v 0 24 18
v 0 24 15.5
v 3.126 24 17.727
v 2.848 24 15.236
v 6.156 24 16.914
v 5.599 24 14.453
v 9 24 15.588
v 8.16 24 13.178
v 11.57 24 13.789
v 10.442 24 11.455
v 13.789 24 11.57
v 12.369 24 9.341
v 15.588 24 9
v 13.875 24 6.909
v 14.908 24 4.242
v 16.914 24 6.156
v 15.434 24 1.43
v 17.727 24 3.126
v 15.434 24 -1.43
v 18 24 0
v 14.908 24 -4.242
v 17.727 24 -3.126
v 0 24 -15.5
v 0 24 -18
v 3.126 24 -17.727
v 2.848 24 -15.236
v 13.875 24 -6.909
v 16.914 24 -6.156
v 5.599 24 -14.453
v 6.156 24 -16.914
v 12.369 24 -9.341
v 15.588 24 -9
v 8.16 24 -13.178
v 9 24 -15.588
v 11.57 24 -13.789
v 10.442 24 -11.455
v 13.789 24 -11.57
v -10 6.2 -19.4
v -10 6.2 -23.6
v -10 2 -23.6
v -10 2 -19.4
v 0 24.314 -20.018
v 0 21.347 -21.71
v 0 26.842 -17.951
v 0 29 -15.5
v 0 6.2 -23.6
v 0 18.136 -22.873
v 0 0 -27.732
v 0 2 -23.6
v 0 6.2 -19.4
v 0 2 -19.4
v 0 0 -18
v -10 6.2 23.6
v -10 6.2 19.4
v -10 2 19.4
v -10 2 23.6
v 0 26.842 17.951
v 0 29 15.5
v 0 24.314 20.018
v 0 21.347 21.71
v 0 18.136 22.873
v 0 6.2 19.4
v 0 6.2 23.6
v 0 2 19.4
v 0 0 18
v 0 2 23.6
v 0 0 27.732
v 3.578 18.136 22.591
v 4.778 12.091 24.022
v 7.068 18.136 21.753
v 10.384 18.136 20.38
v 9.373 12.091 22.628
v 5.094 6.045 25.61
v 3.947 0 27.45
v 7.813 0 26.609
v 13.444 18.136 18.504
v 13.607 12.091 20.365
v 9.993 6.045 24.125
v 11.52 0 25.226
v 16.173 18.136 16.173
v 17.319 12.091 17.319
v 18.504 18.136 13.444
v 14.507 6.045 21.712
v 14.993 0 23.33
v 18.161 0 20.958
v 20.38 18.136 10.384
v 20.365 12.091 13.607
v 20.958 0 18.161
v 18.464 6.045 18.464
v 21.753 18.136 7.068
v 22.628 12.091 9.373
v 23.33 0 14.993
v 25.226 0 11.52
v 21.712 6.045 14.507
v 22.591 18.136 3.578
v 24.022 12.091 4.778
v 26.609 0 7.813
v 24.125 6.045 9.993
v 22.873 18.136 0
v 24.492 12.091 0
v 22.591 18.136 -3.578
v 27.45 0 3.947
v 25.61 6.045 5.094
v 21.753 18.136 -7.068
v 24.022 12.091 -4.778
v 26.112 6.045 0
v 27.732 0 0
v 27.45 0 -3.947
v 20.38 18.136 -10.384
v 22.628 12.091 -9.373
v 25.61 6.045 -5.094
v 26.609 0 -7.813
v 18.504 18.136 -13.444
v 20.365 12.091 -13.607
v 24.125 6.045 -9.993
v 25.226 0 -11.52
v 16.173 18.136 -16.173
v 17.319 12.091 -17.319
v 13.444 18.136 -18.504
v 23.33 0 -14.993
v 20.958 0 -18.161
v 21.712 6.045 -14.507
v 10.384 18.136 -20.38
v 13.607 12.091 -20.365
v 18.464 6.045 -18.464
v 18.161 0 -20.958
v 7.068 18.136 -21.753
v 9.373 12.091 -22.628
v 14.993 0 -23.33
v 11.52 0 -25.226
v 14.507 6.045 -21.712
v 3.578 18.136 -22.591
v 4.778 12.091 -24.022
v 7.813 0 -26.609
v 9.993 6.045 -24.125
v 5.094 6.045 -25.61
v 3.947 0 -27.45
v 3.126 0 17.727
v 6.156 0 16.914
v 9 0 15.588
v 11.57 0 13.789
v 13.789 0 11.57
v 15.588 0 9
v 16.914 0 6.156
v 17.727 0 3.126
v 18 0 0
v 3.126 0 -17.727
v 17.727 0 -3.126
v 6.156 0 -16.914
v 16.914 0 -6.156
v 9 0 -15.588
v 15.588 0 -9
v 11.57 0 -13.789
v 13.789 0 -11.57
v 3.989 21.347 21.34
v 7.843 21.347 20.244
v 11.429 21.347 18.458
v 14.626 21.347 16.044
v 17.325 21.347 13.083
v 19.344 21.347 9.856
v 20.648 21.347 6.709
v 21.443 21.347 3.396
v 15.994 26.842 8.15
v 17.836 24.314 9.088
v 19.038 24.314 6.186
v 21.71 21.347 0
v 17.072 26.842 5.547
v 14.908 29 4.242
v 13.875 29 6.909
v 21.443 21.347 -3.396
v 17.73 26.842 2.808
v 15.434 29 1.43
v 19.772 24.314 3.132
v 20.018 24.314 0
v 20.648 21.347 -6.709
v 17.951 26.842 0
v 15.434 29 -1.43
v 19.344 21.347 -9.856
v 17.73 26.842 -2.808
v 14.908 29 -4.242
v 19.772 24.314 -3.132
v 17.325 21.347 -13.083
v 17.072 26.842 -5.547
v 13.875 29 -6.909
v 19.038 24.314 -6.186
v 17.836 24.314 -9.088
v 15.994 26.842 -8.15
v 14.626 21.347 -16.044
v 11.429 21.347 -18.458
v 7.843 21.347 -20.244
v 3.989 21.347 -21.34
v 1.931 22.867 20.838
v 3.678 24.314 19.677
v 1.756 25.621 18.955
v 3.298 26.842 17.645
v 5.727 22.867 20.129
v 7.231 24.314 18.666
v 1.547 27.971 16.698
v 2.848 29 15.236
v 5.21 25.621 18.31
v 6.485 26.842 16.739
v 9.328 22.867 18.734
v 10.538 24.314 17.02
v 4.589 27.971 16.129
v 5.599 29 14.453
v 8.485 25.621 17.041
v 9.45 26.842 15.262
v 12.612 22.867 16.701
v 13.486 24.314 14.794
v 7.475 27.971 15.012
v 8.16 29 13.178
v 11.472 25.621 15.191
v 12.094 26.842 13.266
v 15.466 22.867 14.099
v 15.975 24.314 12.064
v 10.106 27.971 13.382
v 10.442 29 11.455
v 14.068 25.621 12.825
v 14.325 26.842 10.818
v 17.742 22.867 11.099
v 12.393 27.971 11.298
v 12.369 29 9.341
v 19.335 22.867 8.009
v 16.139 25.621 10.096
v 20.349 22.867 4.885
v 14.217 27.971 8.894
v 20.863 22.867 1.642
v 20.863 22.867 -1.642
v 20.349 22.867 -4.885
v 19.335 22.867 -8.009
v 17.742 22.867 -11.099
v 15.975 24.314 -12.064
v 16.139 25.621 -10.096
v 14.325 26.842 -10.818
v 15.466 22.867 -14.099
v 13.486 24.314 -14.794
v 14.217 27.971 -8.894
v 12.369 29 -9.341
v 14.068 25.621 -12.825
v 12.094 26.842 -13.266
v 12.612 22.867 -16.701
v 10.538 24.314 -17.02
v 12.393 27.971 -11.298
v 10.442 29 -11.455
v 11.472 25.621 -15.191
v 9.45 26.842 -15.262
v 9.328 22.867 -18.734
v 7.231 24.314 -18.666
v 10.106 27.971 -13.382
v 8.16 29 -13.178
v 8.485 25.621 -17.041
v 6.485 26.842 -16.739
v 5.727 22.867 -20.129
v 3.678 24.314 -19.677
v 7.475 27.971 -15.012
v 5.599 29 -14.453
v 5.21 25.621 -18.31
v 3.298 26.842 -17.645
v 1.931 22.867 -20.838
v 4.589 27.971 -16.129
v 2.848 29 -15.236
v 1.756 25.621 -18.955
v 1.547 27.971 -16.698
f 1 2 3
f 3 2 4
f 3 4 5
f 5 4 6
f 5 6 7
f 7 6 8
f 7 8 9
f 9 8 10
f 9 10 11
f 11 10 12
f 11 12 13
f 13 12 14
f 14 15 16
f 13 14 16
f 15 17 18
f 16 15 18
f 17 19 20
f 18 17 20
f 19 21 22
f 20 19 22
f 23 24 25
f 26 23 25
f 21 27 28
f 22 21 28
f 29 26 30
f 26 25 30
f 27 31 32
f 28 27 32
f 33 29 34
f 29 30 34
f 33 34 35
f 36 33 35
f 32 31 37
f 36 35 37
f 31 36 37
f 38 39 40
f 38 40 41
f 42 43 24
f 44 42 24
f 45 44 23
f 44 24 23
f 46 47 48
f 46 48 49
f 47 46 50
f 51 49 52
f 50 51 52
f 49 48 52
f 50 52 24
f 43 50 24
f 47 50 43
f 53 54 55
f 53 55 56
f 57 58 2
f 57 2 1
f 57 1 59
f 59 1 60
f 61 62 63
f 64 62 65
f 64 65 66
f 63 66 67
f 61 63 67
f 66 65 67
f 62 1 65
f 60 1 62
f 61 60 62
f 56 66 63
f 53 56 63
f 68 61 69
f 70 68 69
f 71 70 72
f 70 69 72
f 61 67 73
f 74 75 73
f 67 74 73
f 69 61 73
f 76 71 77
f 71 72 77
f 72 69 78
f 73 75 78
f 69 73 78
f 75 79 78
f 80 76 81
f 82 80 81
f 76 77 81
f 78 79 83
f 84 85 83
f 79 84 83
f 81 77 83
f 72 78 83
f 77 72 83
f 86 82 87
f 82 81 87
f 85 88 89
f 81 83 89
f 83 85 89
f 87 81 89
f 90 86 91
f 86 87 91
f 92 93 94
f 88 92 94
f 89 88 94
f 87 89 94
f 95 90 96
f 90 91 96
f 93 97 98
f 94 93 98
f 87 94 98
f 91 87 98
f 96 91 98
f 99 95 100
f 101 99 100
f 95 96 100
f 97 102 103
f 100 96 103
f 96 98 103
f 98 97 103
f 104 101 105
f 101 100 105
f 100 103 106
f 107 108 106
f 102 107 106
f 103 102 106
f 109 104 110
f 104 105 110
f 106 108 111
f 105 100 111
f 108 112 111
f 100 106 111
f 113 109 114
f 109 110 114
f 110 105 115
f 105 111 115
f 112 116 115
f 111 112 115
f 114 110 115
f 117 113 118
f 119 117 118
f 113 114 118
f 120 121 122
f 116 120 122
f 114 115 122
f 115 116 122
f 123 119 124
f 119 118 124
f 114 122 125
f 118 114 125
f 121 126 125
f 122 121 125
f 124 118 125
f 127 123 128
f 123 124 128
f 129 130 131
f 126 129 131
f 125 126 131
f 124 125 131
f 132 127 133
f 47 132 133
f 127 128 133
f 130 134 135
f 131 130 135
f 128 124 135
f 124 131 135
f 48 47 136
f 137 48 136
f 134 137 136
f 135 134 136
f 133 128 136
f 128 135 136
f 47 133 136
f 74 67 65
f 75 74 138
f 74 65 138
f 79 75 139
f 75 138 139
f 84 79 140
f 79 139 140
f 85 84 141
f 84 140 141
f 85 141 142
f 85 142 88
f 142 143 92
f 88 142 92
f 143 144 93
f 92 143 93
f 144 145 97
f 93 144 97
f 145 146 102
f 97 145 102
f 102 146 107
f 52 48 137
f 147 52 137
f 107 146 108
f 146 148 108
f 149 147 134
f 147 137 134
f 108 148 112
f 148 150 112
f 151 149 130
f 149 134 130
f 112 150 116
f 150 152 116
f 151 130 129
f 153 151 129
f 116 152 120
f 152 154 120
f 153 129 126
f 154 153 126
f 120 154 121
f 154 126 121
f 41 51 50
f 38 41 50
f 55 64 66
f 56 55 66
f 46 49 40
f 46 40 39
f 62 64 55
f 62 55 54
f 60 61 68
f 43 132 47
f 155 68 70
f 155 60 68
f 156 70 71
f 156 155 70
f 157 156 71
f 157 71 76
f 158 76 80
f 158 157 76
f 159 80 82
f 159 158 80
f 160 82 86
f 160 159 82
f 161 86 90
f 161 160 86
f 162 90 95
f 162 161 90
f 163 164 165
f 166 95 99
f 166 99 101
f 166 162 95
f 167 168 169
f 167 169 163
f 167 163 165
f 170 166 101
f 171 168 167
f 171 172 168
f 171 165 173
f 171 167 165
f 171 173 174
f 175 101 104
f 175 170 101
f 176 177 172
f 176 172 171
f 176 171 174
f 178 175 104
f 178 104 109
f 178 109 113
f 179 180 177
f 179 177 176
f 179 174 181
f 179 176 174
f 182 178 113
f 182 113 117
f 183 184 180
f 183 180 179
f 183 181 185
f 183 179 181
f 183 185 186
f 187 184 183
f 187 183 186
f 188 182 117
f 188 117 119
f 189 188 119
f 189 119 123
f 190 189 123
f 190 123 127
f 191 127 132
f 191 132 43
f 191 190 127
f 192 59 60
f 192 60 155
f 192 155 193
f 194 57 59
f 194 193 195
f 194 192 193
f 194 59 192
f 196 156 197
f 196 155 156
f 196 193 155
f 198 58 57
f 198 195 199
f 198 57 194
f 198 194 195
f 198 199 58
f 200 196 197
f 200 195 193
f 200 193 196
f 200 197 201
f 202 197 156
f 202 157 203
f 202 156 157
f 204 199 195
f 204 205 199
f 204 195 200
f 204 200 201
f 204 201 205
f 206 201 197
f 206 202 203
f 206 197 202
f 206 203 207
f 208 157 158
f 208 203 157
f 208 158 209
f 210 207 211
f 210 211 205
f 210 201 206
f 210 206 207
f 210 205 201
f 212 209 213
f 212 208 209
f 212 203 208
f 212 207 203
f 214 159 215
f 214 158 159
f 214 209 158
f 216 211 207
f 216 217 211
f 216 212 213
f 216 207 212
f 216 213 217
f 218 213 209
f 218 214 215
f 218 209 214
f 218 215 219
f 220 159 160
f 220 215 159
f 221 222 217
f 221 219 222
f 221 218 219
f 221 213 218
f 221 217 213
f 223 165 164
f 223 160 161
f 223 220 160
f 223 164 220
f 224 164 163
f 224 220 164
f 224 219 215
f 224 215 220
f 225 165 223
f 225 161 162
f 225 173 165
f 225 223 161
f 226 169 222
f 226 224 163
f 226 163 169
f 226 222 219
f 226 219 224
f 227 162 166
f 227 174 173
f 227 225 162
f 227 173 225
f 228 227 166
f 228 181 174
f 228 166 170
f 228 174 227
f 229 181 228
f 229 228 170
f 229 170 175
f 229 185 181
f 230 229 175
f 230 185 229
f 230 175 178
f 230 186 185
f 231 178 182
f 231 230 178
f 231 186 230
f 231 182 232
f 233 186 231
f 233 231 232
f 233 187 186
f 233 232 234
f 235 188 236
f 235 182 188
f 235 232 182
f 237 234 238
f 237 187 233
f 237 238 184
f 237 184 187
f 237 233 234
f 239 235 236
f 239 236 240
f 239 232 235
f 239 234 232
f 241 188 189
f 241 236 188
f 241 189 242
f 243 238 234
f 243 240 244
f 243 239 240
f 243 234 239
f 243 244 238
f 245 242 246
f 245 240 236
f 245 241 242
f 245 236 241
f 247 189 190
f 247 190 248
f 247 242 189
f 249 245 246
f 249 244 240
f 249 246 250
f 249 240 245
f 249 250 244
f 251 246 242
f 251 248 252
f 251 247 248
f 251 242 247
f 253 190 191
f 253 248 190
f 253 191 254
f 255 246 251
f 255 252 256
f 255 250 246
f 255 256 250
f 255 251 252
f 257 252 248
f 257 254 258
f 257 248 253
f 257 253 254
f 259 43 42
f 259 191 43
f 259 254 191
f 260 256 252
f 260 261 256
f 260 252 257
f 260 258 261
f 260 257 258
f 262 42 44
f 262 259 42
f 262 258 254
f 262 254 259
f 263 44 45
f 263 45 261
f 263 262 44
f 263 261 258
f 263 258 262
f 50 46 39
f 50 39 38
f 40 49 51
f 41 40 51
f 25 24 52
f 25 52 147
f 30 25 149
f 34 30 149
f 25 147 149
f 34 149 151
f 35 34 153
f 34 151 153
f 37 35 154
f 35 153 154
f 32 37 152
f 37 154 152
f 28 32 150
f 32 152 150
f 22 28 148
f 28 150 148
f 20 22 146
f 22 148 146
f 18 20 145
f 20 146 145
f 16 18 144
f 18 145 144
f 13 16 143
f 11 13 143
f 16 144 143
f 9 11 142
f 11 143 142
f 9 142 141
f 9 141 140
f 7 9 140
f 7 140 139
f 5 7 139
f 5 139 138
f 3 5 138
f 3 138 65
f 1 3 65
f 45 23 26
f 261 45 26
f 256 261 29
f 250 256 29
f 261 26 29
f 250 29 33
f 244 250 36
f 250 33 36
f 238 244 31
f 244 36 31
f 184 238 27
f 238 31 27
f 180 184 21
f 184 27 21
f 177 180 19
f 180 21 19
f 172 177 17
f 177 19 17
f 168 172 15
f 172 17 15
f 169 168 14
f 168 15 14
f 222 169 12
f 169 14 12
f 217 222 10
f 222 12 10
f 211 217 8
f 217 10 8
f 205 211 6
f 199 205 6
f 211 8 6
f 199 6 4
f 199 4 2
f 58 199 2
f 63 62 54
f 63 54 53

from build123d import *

# Parameters (mm, degrees)
BOSS_EXTRUDE1_DEPTH = 24
BOSS_EXTRUDE2_DEPTH = 5
CHAMFER1_SIZE       = 8.038475773
CHAMFER1_SIZE_2     = 30
FILLET1_R           = 20
SKETCH3_W           = 4.2
SKETCH3_H           = 4.2
BOSS_EXTRUDE3_DEPTH = 10


with BuildPart() as part:
    # Sketch1 → Boss-Extrude1 (new body)
    with BuildSketch(Plane(origin=(0, 0, 0), x_dir=(1, 0, 0), z_dir=(0, 1, 0))):
        with BuildLine():
            Line((0, 28), (0, 18))
            ThreePointArc((0, 18), (18, 0), (0, -18))
            Line((0, -18), (0, -28))
            ThreePointArc((0, -28), (28, 0), (0, 28))
        make_face()
    extrude(amount=BOSS_EXTRUDE1_DEPTH)

    # Sketch2 → Boss-Extrude2 (add)
    with BuildSketch(Plane(origin=(0, 24, 0), x_dir=(1, 0, 0), z_dir=(0, 1, 0))):
        with BuildLine():
            Line((0, 28), (0, 15.5))
            ThreePointArc((0, 15.5), (15.5, 0), (0, -15.5))
            Line((0, -15.5), (0, -28))
            ThreePointArc((0, -28), (28, 0), (0, 28))
        make_face()
    extrude(amount=BOSS_EXTRUDE2_DEPTH)

    # Chamfer1
    # the kernel refuses this chamfer: 30, 8.038475773 mm, written as the material it takes off along each edge
    with BuildSketch(Plane(origin=(0, 29, 0), x_dir=(-0.9999950652018581, 0, 0.0031415874858793337), z_dir=(-0.0031415874858793337, 0, -0.9999950652018581))) as chamfer1_piece_1:
        Polygon((28 - CHAMFER1_SIZE, 0), (28, -CHAMFER1_SIZE_2), (28, 0), align=None)
    revolve(axis=Axis((0, 29, 0), (0, 1, 0)), revolution_arc=359.64, mode=Mode.SUBTRACT)

    # Fillet1
    # the kernel refuses this fillet: 20 mm, written as the material it takes off along each edge
    with BuildSketch(Plane(origin=(0, 29, 0), x_dir=(-0.9872402067146837, 0, 0.1592381055085398), z_dir=(-0.1592381055085398, 0, -0.9872402067146837))) as fillet1_piece_1:
        with BuildLine():
            CenterArc((3.55400198, -16.040359451), FILLET1_R, 15, 38.323238927)
            Line((15.5, 0), (15.73891996, 0.320807189))
            ThreePointArc((15.73891996, 0.320807189), (17.730762114, 0.4), (19.961524227, 0.4))
            Line((19.961524227, 0.4), (20.347894558, 0.103527618))
            Line((20.347894558, 0.103527618), (23.258888836, -10.76045093))
            Line((23.258888836, -10.76045093), (22.872518506, -10.863978548))
        make_face()
    revolve(axis=Axis((0, 29, 0), (0, 1, 0)), revolution_arc=341.674648162, mode=Mode.SUBTRACT)

    # Sketch3 → Boss-Extrude3 (add)
    with BuildSketch(Plane.ZY):
        with Locations((21.5, 4.1)):
            Rectangle(SKETCH3_W, SKETCH3_H)
        with Locations((-21.5, 4.1)):
            Rectangle(SKETCH3_W, SKETCH3_H)
    extrude(amount=BOSS_EXTRUDE3_DEPTH)


solid = part.part
